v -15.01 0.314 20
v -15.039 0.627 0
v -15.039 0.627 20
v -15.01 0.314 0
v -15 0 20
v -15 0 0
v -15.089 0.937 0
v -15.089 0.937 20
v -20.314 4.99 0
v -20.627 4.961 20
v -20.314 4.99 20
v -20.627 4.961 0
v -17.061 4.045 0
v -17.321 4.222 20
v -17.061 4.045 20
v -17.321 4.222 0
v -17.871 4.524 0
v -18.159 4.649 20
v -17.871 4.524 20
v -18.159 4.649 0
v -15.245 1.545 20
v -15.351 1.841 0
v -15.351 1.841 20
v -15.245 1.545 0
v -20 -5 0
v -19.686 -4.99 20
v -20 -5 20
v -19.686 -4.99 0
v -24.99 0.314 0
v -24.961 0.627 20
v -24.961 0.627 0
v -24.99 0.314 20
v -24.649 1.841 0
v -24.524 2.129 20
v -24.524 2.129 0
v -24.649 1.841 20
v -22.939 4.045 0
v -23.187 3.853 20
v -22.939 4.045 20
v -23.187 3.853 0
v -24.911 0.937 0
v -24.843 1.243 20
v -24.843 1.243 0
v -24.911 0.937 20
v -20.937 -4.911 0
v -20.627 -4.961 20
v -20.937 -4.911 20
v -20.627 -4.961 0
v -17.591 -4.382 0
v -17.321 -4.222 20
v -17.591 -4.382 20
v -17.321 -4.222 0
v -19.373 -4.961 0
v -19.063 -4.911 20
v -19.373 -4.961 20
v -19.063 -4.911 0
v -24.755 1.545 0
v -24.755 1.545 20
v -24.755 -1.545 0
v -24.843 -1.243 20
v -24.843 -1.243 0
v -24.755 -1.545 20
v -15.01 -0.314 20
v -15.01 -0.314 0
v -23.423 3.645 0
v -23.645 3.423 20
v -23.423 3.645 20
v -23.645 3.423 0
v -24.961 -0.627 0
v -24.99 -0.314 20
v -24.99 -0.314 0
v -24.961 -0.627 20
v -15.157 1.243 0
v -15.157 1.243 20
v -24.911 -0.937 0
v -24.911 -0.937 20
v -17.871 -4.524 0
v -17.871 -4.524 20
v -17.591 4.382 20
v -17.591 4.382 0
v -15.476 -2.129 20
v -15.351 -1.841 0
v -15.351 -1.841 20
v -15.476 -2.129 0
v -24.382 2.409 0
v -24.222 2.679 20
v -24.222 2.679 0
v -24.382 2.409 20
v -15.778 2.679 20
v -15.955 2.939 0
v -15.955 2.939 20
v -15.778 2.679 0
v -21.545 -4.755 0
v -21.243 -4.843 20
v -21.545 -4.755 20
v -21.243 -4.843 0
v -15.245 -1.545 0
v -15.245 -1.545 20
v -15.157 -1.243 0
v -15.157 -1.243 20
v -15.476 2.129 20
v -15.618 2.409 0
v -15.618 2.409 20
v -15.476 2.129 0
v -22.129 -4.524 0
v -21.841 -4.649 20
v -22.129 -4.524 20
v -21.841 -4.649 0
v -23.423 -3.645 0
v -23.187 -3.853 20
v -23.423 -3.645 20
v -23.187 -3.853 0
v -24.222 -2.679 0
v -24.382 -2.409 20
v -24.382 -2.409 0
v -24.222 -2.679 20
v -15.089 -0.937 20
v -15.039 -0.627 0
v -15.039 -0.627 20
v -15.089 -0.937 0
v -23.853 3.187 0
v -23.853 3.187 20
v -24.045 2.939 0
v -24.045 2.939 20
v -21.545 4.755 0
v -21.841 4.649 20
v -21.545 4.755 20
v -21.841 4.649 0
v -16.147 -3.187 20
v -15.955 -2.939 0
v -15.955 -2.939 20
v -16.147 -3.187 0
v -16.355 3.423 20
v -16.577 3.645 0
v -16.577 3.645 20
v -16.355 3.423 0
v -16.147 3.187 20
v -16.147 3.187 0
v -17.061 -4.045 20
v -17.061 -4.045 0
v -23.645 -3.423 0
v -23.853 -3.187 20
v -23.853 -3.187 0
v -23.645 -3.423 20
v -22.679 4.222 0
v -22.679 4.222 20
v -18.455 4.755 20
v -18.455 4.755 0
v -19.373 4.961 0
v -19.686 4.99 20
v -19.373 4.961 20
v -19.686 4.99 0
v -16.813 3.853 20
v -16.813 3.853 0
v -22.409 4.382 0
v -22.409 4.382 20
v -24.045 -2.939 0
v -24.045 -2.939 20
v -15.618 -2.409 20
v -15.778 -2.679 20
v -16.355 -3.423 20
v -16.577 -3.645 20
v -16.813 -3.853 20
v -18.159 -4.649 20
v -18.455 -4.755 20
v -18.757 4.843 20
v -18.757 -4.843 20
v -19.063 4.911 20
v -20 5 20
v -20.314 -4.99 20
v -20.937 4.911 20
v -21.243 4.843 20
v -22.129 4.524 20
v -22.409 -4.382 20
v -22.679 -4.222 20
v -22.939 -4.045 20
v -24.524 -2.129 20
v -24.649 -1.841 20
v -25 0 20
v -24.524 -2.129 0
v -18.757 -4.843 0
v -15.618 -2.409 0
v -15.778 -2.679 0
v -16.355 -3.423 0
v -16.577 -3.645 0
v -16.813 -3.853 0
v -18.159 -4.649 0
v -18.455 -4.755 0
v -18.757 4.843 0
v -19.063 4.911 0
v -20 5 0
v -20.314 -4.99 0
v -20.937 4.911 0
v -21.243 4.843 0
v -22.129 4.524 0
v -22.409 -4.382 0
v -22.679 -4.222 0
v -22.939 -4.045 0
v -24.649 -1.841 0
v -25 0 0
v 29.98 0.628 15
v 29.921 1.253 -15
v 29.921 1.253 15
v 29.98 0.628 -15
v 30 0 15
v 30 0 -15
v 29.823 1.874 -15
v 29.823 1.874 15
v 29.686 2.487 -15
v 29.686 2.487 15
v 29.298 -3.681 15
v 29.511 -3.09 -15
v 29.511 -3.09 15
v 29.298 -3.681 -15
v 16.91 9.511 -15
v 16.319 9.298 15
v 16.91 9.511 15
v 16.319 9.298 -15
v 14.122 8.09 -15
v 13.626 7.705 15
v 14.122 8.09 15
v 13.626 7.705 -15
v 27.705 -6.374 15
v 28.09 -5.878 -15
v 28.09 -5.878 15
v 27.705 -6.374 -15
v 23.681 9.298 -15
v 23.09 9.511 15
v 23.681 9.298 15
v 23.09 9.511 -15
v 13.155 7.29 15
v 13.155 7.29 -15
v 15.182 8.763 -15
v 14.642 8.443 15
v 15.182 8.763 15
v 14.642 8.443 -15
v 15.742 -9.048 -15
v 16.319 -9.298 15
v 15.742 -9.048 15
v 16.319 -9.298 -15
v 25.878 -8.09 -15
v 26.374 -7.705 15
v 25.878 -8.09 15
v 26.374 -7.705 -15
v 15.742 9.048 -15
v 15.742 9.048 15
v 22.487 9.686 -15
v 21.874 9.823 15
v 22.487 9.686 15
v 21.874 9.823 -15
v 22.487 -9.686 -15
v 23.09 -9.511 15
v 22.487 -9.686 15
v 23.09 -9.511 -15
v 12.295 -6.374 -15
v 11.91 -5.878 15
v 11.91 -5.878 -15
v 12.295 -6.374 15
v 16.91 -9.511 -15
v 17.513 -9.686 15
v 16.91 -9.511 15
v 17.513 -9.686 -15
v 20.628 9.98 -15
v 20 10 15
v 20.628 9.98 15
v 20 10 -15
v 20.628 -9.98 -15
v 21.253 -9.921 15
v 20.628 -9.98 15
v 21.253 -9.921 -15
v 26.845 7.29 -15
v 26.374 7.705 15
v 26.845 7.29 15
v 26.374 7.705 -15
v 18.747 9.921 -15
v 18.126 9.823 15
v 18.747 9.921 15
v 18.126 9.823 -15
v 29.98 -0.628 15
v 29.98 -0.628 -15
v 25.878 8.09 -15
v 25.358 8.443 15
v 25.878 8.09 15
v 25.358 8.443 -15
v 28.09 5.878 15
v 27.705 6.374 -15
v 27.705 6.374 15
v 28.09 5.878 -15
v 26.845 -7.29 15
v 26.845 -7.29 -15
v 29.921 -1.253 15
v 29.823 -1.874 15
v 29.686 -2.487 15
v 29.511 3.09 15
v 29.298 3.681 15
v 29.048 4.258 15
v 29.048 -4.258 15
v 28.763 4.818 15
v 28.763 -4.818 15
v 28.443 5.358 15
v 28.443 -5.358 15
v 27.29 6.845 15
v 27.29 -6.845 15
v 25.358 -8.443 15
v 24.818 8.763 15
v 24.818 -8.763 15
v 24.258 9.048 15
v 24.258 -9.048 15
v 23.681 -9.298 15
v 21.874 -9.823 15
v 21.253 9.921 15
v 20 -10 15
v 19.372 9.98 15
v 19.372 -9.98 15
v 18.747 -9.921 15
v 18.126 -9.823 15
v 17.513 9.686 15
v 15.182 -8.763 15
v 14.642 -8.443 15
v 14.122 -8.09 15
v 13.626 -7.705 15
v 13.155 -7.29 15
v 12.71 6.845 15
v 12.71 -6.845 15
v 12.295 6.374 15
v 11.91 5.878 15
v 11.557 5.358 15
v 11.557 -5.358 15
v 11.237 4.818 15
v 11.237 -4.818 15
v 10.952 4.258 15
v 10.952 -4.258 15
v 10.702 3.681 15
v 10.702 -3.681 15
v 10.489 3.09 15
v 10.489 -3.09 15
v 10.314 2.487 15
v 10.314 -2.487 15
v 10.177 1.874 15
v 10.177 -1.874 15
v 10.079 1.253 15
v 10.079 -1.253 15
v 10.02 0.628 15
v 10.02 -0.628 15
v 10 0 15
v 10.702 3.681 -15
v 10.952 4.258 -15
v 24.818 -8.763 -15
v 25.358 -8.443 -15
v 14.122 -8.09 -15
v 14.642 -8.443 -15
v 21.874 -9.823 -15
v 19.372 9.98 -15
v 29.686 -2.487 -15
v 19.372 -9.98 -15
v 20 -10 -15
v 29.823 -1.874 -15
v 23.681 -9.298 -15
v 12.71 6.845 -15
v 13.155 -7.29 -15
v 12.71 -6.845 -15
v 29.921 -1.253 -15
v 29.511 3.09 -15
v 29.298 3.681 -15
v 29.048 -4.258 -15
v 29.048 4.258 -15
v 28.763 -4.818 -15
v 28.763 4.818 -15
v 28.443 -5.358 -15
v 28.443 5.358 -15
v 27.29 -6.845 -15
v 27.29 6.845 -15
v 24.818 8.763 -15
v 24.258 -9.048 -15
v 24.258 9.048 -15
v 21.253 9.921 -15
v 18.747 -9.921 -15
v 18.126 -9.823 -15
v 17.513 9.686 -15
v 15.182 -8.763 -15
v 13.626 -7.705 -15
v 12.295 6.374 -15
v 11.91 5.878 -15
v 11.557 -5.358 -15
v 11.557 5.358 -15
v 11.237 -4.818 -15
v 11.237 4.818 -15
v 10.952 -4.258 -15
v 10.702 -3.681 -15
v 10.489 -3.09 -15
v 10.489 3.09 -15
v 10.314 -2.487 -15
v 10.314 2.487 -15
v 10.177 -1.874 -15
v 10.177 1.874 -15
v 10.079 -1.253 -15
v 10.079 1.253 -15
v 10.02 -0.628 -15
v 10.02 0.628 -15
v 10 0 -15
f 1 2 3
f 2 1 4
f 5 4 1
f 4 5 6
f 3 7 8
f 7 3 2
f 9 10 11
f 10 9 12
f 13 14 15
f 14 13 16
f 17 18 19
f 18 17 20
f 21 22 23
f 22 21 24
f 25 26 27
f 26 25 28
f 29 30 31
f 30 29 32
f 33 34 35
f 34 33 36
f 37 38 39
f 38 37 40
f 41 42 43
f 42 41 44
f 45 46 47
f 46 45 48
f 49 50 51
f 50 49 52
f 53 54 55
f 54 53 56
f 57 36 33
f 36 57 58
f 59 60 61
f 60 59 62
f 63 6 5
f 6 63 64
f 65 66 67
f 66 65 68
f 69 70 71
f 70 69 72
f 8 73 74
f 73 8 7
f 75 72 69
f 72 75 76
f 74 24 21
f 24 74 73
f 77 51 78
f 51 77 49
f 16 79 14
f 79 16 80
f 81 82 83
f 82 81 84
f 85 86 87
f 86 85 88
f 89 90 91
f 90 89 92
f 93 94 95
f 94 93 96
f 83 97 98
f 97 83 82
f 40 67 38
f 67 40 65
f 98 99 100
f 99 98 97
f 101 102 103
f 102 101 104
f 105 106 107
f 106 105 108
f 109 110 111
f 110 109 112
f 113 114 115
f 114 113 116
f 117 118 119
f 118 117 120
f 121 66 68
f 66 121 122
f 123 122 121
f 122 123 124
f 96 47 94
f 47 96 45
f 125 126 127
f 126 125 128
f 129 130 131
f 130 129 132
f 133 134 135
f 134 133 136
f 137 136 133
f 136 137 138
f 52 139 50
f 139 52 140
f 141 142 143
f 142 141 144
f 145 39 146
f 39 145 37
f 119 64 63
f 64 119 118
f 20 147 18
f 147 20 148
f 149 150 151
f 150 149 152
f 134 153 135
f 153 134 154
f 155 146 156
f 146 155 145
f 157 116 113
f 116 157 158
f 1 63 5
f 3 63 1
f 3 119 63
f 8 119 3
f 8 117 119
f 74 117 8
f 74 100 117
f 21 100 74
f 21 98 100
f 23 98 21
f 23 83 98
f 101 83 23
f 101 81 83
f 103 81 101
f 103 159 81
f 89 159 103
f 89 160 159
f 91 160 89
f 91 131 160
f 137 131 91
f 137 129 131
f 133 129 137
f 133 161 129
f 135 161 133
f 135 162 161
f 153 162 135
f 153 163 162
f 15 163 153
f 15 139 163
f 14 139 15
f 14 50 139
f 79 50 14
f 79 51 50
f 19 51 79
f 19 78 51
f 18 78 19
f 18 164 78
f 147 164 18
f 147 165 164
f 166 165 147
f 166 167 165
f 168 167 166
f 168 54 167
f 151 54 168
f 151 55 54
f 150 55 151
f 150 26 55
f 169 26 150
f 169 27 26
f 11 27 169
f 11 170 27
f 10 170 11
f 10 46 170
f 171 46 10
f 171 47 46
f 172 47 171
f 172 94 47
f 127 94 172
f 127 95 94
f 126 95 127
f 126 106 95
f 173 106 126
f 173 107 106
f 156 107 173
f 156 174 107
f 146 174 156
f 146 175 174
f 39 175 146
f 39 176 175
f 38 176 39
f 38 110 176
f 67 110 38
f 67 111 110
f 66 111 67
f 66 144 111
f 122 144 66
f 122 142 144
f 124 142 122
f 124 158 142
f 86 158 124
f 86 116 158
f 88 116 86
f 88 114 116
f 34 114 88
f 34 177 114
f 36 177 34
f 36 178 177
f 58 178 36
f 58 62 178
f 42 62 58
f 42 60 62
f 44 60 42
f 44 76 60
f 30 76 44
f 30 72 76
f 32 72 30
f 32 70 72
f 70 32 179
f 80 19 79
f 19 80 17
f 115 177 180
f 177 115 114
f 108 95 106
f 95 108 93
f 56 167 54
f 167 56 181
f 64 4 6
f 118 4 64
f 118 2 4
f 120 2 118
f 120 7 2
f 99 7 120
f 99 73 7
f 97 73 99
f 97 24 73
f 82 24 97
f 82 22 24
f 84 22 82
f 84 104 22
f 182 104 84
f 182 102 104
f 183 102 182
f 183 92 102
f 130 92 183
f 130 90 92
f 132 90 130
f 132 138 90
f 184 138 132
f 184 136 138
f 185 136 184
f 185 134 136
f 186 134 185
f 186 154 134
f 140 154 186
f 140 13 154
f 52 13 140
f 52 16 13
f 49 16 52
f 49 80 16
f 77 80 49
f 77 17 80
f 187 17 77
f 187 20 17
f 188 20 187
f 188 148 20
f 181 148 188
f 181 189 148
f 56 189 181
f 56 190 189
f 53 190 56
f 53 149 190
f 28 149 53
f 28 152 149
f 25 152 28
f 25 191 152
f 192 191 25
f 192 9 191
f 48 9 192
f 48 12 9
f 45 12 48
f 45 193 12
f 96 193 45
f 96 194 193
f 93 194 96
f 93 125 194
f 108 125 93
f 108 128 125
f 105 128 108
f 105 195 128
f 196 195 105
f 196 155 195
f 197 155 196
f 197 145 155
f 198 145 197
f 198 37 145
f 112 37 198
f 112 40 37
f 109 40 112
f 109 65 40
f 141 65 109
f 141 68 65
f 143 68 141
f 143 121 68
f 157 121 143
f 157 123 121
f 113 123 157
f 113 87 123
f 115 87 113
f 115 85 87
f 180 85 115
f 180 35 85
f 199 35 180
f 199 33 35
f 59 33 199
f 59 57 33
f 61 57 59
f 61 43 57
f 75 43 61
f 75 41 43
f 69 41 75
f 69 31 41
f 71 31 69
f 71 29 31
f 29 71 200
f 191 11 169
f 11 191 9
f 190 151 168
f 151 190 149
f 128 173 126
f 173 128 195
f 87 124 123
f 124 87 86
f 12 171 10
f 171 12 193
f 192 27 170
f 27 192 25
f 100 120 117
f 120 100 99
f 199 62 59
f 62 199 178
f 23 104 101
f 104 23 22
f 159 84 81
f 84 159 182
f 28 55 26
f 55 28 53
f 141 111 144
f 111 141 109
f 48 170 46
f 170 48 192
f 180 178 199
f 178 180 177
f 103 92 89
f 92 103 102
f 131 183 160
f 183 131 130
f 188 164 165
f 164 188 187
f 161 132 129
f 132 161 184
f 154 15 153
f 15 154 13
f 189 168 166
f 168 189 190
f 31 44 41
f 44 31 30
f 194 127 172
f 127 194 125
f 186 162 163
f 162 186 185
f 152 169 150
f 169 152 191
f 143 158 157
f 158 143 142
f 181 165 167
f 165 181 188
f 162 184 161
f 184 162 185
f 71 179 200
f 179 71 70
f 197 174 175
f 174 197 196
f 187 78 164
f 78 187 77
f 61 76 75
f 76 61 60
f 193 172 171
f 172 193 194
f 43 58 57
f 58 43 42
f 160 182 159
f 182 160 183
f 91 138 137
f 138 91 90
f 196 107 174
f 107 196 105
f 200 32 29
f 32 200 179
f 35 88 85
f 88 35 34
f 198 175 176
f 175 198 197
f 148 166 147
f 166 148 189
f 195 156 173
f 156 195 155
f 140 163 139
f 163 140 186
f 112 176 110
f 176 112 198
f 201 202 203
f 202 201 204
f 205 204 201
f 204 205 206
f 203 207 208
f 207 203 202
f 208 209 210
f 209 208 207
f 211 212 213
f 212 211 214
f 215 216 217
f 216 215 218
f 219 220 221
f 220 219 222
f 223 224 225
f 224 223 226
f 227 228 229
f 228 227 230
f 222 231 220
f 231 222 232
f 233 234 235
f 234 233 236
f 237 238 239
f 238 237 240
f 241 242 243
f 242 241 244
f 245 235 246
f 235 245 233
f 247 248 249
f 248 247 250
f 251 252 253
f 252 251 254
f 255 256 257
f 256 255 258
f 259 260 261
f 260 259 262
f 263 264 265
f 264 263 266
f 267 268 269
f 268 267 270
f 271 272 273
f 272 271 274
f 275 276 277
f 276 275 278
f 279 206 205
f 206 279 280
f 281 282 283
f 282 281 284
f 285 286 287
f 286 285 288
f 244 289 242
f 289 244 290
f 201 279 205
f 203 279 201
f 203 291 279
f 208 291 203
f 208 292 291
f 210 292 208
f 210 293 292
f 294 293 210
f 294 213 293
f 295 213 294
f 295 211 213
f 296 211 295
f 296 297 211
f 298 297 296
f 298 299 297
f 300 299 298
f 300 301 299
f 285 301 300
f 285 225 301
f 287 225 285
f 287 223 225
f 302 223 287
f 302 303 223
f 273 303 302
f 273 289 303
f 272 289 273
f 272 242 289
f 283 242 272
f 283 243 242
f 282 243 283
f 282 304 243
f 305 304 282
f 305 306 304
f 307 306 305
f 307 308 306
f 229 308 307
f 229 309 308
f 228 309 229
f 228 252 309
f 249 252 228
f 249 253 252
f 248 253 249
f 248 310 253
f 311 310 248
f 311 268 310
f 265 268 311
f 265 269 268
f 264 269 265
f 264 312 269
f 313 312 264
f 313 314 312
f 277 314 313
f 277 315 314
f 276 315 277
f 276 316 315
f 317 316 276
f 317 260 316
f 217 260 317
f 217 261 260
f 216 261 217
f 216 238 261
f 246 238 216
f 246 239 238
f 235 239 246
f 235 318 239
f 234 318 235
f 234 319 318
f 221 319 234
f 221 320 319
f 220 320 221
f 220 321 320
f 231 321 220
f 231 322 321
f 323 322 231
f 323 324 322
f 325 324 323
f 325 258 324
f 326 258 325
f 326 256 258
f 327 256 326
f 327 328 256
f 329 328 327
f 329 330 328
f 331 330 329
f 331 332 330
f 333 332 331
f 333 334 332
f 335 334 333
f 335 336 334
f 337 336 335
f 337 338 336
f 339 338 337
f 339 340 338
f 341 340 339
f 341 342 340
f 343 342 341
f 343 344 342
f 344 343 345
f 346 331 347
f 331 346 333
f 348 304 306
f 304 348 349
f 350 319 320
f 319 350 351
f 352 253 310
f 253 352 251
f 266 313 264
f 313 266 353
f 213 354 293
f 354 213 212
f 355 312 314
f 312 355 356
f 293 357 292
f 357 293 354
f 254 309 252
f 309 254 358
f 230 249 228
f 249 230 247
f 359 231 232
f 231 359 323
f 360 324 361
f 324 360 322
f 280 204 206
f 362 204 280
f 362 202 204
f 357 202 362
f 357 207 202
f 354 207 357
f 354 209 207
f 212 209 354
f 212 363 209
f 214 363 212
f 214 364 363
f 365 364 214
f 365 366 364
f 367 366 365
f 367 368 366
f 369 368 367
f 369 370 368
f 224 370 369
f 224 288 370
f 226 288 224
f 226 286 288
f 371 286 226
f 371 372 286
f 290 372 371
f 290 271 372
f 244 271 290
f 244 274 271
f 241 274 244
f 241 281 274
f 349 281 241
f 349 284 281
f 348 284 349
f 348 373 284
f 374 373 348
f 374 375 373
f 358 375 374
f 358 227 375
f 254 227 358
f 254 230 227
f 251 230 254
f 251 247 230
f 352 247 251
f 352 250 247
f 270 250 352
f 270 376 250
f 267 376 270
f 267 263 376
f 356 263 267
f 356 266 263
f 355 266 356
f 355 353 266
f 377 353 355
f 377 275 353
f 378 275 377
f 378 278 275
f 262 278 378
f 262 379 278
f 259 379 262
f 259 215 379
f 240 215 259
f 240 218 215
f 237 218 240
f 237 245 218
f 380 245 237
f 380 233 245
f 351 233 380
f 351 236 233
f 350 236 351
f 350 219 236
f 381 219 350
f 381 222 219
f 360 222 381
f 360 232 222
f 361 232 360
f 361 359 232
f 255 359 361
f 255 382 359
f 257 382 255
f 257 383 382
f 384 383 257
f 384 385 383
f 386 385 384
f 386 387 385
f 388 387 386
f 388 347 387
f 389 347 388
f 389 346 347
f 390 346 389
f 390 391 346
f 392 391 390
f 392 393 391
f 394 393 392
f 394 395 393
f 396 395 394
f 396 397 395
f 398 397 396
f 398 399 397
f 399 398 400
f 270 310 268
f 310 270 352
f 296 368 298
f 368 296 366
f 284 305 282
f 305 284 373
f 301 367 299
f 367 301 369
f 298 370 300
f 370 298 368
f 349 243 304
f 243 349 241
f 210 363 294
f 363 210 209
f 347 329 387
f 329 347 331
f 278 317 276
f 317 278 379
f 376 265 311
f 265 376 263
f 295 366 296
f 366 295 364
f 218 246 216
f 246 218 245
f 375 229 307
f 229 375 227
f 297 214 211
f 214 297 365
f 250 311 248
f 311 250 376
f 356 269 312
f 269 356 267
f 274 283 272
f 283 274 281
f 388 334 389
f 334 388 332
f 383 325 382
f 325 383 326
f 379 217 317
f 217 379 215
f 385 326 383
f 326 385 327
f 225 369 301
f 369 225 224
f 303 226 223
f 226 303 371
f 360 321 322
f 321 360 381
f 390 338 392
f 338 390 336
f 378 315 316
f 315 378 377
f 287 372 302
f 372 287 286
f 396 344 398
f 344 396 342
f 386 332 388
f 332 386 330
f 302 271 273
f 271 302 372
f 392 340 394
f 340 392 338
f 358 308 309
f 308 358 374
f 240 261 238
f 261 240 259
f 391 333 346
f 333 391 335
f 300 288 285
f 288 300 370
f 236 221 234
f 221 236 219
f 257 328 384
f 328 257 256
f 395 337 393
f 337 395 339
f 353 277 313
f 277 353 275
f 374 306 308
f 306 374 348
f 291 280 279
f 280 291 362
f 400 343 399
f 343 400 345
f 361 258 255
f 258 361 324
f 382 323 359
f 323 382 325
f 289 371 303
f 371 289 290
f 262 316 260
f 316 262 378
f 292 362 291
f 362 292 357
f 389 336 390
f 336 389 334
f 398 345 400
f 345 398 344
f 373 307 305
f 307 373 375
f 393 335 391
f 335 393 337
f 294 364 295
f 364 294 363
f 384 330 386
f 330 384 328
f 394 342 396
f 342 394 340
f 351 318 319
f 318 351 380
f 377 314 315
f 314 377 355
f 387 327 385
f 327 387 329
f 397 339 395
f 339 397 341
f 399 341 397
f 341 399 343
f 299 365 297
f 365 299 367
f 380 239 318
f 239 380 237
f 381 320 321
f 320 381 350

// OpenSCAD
// file: ../../lib/shapes/cylinder.scad
// lib/shapes/cylinder.scad

/**
 * Creates a cylinder with the specified dimensions.
 *
 * @param height The height of the cylinder.
 * @param diameter The diameter of the cylinder.
 * @param center Boolean to center the cylinder at the origin.
 * @param $fn The number of fragments (resolution) to render the cylinder.
 */
module shapeCylinder(height = 20, diameter = 10, center = false, $fn = 100) {
    cylinder(h = height, d = diameter, center = center, $fn = $fn);
}
// main file
// tests/shapes/test_cylinder.scad

use <../../lib/shapes/cylinder.scad>

module testCylinder() {
    translate([-20, 0, 0])
    shapeCylinder(height = 20, diameter = 10);

    translate([20, 0, 0])
    shapeCylinder(height = 30, diameter = 20, center = true);
}

// Run tests
testCylinder();
